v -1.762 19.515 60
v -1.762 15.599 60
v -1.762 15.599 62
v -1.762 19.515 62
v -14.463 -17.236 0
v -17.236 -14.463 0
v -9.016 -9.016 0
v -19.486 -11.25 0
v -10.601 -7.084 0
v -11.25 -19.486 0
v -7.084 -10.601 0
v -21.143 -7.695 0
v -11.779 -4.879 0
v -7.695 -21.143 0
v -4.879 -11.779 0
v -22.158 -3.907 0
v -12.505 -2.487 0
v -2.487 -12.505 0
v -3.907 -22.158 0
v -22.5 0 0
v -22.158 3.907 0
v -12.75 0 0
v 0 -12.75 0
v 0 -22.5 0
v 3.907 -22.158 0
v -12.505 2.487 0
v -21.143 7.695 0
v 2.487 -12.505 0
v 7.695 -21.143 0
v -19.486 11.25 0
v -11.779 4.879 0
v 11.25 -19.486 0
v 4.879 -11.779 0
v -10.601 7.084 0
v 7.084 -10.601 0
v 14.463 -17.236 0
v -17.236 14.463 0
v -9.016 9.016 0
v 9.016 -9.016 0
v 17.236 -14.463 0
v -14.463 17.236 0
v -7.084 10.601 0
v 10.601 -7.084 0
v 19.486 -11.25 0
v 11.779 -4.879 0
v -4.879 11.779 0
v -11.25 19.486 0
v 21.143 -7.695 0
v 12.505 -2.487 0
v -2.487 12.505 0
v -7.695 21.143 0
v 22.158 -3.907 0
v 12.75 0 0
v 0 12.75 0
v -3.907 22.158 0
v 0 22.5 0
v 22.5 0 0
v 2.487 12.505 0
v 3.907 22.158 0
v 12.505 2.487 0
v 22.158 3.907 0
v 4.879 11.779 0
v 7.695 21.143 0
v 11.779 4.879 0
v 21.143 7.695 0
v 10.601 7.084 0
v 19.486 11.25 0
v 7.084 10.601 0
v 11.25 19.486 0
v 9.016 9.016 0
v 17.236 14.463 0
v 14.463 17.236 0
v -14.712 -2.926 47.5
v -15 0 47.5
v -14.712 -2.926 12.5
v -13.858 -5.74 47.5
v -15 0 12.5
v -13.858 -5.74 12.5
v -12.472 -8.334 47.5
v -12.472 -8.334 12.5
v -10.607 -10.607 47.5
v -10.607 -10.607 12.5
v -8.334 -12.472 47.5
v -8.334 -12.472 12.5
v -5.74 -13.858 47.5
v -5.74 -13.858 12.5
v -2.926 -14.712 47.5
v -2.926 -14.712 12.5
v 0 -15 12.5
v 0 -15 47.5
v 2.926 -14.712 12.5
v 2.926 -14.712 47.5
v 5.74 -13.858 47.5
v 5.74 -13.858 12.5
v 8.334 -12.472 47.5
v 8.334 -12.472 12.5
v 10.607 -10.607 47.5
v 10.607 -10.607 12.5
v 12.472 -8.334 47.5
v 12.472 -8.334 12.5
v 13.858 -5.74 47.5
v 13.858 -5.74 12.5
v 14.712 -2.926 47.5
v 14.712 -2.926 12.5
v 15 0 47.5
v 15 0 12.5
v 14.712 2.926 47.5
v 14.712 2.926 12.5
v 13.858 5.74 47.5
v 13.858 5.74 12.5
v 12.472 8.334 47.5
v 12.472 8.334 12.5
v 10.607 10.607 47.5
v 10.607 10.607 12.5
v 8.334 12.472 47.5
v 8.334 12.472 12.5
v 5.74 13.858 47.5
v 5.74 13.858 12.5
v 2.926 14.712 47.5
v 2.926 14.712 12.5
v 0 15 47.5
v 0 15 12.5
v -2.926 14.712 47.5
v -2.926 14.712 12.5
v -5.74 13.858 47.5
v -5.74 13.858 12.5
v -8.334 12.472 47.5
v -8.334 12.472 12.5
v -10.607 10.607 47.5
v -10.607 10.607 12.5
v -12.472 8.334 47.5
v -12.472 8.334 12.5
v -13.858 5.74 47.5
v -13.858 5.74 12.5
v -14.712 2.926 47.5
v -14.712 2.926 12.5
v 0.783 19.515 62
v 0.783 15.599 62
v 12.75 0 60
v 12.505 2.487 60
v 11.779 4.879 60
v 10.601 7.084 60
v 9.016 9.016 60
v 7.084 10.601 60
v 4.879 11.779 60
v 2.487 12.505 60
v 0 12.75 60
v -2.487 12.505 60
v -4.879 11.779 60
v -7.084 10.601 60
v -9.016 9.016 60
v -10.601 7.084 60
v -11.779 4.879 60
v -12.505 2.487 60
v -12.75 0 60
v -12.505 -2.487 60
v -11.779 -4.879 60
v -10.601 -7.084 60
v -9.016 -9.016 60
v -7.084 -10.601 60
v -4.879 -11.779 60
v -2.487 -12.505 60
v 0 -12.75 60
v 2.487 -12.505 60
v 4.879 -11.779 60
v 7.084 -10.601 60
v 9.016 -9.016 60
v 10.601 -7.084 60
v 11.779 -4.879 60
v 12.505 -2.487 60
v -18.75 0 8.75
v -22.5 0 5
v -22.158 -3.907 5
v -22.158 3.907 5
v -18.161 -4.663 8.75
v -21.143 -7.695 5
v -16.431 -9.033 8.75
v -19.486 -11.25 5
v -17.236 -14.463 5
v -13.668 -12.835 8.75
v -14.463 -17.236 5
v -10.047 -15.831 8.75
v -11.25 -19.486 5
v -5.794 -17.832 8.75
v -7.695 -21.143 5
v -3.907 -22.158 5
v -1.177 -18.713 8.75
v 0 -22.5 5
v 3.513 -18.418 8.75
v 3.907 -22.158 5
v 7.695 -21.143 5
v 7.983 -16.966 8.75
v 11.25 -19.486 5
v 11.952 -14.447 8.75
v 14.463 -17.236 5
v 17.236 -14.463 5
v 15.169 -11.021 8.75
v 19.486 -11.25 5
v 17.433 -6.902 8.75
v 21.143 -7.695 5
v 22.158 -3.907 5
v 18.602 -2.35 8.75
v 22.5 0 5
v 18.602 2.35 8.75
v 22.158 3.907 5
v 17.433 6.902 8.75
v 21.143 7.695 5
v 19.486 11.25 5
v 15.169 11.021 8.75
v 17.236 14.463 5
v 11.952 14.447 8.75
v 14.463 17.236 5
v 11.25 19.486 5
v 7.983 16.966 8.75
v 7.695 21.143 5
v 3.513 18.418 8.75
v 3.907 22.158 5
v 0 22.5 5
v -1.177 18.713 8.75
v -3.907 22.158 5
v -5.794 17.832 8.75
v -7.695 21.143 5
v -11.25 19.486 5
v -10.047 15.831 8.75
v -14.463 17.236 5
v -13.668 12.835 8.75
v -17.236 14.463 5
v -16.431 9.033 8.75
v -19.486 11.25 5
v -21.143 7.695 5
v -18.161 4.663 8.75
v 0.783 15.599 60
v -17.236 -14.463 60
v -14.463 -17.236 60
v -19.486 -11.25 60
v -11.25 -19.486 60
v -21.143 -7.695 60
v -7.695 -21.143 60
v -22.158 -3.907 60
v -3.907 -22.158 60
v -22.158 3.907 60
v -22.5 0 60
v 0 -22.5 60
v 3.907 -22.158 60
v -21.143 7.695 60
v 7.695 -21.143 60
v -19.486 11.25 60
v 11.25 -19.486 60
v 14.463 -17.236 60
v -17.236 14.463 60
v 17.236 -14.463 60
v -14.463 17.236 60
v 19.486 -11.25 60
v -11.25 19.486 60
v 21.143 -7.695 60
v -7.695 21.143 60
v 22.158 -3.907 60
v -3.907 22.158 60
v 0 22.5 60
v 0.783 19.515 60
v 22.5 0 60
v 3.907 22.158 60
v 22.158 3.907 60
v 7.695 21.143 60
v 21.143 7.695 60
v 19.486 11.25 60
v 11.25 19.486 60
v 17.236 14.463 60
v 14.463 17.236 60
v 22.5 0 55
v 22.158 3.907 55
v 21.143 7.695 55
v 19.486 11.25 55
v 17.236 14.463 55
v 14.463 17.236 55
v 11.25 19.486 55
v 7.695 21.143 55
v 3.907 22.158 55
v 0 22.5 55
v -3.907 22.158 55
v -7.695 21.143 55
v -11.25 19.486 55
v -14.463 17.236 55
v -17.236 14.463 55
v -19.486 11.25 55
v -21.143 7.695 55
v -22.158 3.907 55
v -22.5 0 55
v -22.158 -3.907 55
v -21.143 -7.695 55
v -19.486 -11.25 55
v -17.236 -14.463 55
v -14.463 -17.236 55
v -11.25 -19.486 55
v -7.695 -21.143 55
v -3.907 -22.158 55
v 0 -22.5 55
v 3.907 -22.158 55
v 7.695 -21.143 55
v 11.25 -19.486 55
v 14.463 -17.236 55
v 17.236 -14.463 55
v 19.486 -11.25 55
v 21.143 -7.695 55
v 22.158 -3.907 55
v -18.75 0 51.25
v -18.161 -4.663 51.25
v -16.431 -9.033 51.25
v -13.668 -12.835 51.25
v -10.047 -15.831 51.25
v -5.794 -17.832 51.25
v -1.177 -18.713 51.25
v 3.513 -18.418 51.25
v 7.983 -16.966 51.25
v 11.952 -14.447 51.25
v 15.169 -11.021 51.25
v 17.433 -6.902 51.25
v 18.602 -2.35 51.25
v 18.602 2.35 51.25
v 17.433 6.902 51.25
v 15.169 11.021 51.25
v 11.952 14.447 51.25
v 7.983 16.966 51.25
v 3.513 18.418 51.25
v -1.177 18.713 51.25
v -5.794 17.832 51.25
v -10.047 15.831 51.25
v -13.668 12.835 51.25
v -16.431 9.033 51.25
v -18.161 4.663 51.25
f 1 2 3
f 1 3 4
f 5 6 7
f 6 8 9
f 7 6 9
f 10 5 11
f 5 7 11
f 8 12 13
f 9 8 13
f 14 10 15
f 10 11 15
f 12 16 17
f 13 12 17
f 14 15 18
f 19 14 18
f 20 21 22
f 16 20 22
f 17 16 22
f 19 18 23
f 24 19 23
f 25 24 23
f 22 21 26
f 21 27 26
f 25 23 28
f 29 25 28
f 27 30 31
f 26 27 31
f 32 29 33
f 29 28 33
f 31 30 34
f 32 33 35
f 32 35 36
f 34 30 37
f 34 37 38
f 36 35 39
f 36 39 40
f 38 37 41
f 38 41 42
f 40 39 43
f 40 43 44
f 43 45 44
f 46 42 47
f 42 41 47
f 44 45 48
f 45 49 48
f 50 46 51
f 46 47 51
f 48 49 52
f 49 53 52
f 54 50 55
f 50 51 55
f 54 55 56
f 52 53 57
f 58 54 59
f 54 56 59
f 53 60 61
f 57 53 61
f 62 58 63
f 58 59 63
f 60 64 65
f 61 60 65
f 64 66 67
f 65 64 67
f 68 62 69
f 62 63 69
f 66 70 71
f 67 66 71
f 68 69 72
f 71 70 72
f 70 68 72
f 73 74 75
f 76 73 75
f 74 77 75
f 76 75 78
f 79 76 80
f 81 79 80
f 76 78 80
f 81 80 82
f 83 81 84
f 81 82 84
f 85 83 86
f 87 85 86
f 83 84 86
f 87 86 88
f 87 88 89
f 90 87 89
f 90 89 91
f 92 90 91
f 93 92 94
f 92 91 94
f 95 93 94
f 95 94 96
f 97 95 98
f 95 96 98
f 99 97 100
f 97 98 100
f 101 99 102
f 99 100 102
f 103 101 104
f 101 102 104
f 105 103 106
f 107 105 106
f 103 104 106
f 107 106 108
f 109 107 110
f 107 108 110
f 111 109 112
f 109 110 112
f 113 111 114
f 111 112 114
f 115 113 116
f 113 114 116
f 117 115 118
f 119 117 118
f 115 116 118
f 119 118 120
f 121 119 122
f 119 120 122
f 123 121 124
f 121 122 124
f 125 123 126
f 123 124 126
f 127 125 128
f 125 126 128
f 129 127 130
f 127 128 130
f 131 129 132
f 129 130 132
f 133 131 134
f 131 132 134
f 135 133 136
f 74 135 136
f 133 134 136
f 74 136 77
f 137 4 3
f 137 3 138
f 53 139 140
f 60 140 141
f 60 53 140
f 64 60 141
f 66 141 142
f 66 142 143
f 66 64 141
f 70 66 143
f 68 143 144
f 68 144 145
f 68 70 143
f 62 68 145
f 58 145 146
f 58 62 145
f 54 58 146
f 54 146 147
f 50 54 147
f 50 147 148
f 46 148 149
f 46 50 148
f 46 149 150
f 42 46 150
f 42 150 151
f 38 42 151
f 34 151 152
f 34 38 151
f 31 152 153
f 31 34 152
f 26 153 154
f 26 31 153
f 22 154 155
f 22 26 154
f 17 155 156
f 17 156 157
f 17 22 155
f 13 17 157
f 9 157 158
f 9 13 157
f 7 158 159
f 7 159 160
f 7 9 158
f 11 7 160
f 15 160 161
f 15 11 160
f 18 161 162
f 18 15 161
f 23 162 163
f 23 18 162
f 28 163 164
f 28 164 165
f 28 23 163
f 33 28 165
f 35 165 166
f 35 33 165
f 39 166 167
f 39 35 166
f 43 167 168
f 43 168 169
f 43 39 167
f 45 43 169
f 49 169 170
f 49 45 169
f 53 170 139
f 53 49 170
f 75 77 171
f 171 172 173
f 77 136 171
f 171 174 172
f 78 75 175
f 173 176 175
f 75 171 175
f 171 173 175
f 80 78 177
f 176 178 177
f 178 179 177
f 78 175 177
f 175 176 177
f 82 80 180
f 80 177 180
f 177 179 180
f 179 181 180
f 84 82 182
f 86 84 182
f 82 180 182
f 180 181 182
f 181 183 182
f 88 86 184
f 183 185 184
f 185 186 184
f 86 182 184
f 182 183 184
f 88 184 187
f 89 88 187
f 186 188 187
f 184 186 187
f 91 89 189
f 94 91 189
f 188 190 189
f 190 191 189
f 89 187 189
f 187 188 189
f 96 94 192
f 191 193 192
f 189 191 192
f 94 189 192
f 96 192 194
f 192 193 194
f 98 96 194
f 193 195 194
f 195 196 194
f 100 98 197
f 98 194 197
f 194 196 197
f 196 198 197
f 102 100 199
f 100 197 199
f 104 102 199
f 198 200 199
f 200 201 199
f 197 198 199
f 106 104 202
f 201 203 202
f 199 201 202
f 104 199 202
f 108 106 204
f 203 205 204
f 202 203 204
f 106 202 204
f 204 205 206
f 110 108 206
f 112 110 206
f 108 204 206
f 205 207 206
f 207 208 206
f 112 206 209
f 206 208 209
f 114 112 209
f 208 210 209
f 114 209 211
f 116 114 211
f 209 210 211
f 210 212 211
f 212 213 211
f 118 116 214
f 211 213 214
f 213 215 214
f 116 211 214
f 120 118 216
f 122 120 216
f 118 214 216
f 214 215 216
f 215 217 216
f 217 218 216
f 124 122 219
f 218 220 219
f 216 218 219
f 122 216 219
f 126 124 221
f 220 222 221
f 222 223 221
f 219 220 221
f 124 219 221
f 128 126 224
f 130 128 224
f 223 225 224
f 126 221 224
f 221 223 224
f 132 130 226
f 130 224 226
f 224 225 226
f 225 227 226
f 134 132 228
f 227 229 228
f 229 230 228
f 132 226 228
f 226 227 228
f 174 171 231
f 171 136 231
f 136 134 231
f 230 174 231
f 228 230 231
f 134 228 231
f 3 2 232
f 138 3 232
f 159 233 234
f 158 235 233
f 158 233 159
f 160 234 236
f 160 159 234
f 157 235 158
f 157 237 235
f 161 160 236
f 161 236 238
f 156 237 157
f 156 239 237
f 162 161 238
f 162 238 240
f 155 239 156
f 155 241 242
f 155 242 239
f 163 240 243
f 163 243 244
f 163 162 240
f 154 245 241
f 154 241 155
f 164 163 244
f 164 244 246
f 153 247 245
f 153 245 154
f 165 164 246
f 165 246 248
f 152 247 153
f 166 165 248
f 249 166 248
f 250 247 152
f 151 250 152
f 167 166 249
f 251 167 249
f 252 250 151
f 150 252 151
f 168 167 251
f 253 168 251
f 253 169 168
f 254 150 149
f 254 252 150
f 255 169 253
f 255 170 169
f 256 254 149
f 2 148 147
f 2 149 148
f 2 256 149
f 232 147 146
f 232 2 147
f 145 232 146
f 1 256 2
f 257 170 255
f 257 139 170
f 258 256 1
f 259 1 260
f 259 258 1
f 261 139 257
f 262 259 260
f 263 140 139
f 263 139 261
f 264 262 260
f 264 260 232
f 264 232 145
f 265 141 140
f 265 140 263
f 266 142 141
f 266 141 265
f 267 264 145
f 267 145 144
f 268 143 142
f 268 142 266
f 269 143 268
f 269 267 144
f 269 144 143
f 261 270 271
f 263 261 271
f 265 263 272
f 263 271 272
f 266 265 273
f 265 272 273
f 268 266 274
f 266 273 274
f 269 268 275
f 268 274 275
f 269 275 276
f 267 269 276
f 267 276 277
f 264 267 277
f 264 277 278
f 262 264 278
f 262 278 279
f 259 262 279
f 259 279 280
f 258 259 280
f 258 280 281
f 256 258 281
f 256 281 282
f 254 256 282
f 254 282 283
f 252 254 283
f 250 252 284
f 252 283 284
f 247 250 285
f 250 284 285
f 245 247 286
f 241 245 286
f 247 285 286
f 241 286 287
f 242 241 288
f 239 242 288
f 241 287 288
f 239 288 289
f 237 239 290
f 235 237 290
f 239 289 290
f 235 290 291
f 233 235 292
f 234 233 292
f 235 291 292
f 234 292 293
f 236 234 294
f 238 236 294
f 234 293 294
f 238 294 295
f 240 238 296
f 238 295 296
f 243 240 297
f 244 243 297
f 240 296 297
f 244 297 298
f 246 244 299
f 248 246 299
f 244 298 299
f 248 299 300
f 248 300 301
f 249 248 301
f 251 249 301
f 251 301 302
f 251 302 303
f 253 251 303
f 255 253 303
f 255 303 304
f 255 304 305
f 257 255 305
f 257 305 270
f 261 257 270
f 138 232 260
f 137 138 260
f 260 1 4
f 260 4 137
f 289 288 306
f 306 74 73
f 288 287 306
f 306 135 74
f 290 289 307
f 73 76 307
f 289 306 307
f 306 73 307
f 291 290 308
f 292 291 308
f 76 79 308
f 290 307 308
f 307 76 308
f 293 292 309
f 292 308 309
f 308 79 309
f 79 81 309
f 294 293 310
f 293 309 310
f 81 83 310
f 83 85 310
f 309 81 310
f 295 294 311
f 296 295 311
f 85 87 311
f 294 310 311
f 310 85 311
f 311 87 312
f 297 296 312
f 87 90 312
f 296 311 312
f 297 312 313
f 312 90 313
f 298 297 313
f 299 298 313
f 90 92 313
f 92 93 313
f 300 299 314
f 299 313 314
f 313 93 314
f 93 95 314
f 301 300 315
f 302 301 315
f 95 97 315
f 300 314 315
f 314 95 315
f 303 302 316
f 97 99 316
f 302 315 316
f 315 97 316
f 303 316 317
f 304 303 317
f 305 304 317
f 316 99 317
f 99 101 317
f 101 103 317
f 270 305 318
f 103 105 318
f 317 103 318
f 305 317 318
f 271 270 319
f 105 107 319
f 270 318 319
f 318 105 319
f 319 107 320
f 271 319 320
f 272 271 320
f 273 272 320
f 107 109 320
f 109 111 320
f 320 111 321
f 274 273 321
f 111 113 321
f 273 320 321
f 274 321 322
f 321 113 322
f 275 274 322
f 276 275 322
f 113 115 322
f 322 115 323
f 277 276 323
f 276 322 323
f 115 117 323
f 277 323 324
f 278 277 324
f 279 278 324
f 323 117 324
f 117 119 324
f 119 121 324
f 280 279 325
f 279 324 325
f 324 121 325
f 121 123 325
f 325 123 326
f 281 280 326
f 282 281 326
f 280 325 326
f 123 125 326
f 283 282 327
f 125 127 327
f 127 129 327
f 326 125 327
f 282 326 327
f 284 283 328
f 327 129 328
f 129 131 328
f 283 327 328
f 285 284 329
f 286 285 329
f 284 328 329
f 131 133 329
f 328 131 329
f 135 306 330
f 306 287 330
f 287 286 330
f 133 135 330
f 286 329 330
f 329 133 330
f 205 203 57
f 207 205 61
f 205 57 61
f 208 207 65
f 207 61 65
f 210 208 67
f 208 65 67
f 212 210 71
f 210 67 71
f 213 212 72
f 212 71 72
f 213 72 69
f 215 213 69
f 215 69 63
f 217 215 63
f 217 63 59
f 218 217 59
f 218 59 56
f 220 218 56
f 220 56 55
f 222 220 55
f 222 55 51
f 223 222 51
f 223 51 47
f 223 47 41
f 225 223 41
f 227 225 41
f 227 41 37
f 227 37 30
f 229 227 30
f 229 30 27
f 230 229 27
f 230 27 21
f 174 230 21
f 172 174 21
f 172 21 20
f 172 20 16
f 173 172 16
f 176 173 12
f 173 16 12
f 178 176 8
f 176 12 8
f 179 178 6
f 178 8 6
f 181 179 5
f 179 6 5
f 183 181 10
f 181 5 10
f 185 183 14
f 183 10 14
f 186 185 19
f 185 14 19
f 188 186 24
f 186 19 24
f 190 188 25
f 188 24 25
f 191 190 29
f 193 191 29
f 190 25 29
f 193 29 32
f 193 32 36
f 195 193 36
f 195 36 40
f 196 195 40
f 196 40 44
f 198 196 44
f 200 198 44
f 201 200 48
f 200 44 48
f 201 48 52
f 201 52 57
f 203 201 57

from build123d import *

# Parameters (mm, degrees)
SKETCH2_R           = 22.5
SKETCH2_R_2         = 12.75
BOSS_EXTRUDE1_DEPTH = 60
SKETCH4_W           = 2.545484213
SKETCH4_H           = 3.916129558
BOSS_EXTRUDE2_DEPTH = 2


with BuildPart() as part:
    # Sketch2 → Boss-Extrude1 (new body)
    with BuildSketch(Plane.XY):
        Circle(SKETCH2_R)
        Circle(SKETCH2_R_2, mode=Mode.SUBTRACT)
    extrude(amount=BOSS_EXTRUDE1_DEPTH)

    # Sketch3 → Cut-Revolve1 (revolve, cut)
    with BuildSketch(Plane(origin=(0, 0, 0), x_dir=(1, 0, 0), z_dir=(0, 1, 0)), mode=Mode.PRIVATE) as cut_revolve1_sk:
        Polygon((22.5, -5), (22.5, -55), (15, -47.5), (15, -12.5), align=None)
    revolve(cut_revolve1_sk.sketch.rotate(Axis((0, 0, -10.796502134), (0, 0, 1)), 180), axis=Axis((0, 0, -10.796502134), (0, 0, 1)), mode=Mode.SUBTRACT)

    # Sketch4 → Boss-Extrude2 (add)
    with BuildSketch(Plane.XY.offset(60)):
        with Locations((-0.489516195, 17.557314188)):
            Rectangle(SKETCH4_W, SKETCH4_H)
    extrude(amount=BOSS_EXTRUDE2_DEPTH)


solid = part.part
